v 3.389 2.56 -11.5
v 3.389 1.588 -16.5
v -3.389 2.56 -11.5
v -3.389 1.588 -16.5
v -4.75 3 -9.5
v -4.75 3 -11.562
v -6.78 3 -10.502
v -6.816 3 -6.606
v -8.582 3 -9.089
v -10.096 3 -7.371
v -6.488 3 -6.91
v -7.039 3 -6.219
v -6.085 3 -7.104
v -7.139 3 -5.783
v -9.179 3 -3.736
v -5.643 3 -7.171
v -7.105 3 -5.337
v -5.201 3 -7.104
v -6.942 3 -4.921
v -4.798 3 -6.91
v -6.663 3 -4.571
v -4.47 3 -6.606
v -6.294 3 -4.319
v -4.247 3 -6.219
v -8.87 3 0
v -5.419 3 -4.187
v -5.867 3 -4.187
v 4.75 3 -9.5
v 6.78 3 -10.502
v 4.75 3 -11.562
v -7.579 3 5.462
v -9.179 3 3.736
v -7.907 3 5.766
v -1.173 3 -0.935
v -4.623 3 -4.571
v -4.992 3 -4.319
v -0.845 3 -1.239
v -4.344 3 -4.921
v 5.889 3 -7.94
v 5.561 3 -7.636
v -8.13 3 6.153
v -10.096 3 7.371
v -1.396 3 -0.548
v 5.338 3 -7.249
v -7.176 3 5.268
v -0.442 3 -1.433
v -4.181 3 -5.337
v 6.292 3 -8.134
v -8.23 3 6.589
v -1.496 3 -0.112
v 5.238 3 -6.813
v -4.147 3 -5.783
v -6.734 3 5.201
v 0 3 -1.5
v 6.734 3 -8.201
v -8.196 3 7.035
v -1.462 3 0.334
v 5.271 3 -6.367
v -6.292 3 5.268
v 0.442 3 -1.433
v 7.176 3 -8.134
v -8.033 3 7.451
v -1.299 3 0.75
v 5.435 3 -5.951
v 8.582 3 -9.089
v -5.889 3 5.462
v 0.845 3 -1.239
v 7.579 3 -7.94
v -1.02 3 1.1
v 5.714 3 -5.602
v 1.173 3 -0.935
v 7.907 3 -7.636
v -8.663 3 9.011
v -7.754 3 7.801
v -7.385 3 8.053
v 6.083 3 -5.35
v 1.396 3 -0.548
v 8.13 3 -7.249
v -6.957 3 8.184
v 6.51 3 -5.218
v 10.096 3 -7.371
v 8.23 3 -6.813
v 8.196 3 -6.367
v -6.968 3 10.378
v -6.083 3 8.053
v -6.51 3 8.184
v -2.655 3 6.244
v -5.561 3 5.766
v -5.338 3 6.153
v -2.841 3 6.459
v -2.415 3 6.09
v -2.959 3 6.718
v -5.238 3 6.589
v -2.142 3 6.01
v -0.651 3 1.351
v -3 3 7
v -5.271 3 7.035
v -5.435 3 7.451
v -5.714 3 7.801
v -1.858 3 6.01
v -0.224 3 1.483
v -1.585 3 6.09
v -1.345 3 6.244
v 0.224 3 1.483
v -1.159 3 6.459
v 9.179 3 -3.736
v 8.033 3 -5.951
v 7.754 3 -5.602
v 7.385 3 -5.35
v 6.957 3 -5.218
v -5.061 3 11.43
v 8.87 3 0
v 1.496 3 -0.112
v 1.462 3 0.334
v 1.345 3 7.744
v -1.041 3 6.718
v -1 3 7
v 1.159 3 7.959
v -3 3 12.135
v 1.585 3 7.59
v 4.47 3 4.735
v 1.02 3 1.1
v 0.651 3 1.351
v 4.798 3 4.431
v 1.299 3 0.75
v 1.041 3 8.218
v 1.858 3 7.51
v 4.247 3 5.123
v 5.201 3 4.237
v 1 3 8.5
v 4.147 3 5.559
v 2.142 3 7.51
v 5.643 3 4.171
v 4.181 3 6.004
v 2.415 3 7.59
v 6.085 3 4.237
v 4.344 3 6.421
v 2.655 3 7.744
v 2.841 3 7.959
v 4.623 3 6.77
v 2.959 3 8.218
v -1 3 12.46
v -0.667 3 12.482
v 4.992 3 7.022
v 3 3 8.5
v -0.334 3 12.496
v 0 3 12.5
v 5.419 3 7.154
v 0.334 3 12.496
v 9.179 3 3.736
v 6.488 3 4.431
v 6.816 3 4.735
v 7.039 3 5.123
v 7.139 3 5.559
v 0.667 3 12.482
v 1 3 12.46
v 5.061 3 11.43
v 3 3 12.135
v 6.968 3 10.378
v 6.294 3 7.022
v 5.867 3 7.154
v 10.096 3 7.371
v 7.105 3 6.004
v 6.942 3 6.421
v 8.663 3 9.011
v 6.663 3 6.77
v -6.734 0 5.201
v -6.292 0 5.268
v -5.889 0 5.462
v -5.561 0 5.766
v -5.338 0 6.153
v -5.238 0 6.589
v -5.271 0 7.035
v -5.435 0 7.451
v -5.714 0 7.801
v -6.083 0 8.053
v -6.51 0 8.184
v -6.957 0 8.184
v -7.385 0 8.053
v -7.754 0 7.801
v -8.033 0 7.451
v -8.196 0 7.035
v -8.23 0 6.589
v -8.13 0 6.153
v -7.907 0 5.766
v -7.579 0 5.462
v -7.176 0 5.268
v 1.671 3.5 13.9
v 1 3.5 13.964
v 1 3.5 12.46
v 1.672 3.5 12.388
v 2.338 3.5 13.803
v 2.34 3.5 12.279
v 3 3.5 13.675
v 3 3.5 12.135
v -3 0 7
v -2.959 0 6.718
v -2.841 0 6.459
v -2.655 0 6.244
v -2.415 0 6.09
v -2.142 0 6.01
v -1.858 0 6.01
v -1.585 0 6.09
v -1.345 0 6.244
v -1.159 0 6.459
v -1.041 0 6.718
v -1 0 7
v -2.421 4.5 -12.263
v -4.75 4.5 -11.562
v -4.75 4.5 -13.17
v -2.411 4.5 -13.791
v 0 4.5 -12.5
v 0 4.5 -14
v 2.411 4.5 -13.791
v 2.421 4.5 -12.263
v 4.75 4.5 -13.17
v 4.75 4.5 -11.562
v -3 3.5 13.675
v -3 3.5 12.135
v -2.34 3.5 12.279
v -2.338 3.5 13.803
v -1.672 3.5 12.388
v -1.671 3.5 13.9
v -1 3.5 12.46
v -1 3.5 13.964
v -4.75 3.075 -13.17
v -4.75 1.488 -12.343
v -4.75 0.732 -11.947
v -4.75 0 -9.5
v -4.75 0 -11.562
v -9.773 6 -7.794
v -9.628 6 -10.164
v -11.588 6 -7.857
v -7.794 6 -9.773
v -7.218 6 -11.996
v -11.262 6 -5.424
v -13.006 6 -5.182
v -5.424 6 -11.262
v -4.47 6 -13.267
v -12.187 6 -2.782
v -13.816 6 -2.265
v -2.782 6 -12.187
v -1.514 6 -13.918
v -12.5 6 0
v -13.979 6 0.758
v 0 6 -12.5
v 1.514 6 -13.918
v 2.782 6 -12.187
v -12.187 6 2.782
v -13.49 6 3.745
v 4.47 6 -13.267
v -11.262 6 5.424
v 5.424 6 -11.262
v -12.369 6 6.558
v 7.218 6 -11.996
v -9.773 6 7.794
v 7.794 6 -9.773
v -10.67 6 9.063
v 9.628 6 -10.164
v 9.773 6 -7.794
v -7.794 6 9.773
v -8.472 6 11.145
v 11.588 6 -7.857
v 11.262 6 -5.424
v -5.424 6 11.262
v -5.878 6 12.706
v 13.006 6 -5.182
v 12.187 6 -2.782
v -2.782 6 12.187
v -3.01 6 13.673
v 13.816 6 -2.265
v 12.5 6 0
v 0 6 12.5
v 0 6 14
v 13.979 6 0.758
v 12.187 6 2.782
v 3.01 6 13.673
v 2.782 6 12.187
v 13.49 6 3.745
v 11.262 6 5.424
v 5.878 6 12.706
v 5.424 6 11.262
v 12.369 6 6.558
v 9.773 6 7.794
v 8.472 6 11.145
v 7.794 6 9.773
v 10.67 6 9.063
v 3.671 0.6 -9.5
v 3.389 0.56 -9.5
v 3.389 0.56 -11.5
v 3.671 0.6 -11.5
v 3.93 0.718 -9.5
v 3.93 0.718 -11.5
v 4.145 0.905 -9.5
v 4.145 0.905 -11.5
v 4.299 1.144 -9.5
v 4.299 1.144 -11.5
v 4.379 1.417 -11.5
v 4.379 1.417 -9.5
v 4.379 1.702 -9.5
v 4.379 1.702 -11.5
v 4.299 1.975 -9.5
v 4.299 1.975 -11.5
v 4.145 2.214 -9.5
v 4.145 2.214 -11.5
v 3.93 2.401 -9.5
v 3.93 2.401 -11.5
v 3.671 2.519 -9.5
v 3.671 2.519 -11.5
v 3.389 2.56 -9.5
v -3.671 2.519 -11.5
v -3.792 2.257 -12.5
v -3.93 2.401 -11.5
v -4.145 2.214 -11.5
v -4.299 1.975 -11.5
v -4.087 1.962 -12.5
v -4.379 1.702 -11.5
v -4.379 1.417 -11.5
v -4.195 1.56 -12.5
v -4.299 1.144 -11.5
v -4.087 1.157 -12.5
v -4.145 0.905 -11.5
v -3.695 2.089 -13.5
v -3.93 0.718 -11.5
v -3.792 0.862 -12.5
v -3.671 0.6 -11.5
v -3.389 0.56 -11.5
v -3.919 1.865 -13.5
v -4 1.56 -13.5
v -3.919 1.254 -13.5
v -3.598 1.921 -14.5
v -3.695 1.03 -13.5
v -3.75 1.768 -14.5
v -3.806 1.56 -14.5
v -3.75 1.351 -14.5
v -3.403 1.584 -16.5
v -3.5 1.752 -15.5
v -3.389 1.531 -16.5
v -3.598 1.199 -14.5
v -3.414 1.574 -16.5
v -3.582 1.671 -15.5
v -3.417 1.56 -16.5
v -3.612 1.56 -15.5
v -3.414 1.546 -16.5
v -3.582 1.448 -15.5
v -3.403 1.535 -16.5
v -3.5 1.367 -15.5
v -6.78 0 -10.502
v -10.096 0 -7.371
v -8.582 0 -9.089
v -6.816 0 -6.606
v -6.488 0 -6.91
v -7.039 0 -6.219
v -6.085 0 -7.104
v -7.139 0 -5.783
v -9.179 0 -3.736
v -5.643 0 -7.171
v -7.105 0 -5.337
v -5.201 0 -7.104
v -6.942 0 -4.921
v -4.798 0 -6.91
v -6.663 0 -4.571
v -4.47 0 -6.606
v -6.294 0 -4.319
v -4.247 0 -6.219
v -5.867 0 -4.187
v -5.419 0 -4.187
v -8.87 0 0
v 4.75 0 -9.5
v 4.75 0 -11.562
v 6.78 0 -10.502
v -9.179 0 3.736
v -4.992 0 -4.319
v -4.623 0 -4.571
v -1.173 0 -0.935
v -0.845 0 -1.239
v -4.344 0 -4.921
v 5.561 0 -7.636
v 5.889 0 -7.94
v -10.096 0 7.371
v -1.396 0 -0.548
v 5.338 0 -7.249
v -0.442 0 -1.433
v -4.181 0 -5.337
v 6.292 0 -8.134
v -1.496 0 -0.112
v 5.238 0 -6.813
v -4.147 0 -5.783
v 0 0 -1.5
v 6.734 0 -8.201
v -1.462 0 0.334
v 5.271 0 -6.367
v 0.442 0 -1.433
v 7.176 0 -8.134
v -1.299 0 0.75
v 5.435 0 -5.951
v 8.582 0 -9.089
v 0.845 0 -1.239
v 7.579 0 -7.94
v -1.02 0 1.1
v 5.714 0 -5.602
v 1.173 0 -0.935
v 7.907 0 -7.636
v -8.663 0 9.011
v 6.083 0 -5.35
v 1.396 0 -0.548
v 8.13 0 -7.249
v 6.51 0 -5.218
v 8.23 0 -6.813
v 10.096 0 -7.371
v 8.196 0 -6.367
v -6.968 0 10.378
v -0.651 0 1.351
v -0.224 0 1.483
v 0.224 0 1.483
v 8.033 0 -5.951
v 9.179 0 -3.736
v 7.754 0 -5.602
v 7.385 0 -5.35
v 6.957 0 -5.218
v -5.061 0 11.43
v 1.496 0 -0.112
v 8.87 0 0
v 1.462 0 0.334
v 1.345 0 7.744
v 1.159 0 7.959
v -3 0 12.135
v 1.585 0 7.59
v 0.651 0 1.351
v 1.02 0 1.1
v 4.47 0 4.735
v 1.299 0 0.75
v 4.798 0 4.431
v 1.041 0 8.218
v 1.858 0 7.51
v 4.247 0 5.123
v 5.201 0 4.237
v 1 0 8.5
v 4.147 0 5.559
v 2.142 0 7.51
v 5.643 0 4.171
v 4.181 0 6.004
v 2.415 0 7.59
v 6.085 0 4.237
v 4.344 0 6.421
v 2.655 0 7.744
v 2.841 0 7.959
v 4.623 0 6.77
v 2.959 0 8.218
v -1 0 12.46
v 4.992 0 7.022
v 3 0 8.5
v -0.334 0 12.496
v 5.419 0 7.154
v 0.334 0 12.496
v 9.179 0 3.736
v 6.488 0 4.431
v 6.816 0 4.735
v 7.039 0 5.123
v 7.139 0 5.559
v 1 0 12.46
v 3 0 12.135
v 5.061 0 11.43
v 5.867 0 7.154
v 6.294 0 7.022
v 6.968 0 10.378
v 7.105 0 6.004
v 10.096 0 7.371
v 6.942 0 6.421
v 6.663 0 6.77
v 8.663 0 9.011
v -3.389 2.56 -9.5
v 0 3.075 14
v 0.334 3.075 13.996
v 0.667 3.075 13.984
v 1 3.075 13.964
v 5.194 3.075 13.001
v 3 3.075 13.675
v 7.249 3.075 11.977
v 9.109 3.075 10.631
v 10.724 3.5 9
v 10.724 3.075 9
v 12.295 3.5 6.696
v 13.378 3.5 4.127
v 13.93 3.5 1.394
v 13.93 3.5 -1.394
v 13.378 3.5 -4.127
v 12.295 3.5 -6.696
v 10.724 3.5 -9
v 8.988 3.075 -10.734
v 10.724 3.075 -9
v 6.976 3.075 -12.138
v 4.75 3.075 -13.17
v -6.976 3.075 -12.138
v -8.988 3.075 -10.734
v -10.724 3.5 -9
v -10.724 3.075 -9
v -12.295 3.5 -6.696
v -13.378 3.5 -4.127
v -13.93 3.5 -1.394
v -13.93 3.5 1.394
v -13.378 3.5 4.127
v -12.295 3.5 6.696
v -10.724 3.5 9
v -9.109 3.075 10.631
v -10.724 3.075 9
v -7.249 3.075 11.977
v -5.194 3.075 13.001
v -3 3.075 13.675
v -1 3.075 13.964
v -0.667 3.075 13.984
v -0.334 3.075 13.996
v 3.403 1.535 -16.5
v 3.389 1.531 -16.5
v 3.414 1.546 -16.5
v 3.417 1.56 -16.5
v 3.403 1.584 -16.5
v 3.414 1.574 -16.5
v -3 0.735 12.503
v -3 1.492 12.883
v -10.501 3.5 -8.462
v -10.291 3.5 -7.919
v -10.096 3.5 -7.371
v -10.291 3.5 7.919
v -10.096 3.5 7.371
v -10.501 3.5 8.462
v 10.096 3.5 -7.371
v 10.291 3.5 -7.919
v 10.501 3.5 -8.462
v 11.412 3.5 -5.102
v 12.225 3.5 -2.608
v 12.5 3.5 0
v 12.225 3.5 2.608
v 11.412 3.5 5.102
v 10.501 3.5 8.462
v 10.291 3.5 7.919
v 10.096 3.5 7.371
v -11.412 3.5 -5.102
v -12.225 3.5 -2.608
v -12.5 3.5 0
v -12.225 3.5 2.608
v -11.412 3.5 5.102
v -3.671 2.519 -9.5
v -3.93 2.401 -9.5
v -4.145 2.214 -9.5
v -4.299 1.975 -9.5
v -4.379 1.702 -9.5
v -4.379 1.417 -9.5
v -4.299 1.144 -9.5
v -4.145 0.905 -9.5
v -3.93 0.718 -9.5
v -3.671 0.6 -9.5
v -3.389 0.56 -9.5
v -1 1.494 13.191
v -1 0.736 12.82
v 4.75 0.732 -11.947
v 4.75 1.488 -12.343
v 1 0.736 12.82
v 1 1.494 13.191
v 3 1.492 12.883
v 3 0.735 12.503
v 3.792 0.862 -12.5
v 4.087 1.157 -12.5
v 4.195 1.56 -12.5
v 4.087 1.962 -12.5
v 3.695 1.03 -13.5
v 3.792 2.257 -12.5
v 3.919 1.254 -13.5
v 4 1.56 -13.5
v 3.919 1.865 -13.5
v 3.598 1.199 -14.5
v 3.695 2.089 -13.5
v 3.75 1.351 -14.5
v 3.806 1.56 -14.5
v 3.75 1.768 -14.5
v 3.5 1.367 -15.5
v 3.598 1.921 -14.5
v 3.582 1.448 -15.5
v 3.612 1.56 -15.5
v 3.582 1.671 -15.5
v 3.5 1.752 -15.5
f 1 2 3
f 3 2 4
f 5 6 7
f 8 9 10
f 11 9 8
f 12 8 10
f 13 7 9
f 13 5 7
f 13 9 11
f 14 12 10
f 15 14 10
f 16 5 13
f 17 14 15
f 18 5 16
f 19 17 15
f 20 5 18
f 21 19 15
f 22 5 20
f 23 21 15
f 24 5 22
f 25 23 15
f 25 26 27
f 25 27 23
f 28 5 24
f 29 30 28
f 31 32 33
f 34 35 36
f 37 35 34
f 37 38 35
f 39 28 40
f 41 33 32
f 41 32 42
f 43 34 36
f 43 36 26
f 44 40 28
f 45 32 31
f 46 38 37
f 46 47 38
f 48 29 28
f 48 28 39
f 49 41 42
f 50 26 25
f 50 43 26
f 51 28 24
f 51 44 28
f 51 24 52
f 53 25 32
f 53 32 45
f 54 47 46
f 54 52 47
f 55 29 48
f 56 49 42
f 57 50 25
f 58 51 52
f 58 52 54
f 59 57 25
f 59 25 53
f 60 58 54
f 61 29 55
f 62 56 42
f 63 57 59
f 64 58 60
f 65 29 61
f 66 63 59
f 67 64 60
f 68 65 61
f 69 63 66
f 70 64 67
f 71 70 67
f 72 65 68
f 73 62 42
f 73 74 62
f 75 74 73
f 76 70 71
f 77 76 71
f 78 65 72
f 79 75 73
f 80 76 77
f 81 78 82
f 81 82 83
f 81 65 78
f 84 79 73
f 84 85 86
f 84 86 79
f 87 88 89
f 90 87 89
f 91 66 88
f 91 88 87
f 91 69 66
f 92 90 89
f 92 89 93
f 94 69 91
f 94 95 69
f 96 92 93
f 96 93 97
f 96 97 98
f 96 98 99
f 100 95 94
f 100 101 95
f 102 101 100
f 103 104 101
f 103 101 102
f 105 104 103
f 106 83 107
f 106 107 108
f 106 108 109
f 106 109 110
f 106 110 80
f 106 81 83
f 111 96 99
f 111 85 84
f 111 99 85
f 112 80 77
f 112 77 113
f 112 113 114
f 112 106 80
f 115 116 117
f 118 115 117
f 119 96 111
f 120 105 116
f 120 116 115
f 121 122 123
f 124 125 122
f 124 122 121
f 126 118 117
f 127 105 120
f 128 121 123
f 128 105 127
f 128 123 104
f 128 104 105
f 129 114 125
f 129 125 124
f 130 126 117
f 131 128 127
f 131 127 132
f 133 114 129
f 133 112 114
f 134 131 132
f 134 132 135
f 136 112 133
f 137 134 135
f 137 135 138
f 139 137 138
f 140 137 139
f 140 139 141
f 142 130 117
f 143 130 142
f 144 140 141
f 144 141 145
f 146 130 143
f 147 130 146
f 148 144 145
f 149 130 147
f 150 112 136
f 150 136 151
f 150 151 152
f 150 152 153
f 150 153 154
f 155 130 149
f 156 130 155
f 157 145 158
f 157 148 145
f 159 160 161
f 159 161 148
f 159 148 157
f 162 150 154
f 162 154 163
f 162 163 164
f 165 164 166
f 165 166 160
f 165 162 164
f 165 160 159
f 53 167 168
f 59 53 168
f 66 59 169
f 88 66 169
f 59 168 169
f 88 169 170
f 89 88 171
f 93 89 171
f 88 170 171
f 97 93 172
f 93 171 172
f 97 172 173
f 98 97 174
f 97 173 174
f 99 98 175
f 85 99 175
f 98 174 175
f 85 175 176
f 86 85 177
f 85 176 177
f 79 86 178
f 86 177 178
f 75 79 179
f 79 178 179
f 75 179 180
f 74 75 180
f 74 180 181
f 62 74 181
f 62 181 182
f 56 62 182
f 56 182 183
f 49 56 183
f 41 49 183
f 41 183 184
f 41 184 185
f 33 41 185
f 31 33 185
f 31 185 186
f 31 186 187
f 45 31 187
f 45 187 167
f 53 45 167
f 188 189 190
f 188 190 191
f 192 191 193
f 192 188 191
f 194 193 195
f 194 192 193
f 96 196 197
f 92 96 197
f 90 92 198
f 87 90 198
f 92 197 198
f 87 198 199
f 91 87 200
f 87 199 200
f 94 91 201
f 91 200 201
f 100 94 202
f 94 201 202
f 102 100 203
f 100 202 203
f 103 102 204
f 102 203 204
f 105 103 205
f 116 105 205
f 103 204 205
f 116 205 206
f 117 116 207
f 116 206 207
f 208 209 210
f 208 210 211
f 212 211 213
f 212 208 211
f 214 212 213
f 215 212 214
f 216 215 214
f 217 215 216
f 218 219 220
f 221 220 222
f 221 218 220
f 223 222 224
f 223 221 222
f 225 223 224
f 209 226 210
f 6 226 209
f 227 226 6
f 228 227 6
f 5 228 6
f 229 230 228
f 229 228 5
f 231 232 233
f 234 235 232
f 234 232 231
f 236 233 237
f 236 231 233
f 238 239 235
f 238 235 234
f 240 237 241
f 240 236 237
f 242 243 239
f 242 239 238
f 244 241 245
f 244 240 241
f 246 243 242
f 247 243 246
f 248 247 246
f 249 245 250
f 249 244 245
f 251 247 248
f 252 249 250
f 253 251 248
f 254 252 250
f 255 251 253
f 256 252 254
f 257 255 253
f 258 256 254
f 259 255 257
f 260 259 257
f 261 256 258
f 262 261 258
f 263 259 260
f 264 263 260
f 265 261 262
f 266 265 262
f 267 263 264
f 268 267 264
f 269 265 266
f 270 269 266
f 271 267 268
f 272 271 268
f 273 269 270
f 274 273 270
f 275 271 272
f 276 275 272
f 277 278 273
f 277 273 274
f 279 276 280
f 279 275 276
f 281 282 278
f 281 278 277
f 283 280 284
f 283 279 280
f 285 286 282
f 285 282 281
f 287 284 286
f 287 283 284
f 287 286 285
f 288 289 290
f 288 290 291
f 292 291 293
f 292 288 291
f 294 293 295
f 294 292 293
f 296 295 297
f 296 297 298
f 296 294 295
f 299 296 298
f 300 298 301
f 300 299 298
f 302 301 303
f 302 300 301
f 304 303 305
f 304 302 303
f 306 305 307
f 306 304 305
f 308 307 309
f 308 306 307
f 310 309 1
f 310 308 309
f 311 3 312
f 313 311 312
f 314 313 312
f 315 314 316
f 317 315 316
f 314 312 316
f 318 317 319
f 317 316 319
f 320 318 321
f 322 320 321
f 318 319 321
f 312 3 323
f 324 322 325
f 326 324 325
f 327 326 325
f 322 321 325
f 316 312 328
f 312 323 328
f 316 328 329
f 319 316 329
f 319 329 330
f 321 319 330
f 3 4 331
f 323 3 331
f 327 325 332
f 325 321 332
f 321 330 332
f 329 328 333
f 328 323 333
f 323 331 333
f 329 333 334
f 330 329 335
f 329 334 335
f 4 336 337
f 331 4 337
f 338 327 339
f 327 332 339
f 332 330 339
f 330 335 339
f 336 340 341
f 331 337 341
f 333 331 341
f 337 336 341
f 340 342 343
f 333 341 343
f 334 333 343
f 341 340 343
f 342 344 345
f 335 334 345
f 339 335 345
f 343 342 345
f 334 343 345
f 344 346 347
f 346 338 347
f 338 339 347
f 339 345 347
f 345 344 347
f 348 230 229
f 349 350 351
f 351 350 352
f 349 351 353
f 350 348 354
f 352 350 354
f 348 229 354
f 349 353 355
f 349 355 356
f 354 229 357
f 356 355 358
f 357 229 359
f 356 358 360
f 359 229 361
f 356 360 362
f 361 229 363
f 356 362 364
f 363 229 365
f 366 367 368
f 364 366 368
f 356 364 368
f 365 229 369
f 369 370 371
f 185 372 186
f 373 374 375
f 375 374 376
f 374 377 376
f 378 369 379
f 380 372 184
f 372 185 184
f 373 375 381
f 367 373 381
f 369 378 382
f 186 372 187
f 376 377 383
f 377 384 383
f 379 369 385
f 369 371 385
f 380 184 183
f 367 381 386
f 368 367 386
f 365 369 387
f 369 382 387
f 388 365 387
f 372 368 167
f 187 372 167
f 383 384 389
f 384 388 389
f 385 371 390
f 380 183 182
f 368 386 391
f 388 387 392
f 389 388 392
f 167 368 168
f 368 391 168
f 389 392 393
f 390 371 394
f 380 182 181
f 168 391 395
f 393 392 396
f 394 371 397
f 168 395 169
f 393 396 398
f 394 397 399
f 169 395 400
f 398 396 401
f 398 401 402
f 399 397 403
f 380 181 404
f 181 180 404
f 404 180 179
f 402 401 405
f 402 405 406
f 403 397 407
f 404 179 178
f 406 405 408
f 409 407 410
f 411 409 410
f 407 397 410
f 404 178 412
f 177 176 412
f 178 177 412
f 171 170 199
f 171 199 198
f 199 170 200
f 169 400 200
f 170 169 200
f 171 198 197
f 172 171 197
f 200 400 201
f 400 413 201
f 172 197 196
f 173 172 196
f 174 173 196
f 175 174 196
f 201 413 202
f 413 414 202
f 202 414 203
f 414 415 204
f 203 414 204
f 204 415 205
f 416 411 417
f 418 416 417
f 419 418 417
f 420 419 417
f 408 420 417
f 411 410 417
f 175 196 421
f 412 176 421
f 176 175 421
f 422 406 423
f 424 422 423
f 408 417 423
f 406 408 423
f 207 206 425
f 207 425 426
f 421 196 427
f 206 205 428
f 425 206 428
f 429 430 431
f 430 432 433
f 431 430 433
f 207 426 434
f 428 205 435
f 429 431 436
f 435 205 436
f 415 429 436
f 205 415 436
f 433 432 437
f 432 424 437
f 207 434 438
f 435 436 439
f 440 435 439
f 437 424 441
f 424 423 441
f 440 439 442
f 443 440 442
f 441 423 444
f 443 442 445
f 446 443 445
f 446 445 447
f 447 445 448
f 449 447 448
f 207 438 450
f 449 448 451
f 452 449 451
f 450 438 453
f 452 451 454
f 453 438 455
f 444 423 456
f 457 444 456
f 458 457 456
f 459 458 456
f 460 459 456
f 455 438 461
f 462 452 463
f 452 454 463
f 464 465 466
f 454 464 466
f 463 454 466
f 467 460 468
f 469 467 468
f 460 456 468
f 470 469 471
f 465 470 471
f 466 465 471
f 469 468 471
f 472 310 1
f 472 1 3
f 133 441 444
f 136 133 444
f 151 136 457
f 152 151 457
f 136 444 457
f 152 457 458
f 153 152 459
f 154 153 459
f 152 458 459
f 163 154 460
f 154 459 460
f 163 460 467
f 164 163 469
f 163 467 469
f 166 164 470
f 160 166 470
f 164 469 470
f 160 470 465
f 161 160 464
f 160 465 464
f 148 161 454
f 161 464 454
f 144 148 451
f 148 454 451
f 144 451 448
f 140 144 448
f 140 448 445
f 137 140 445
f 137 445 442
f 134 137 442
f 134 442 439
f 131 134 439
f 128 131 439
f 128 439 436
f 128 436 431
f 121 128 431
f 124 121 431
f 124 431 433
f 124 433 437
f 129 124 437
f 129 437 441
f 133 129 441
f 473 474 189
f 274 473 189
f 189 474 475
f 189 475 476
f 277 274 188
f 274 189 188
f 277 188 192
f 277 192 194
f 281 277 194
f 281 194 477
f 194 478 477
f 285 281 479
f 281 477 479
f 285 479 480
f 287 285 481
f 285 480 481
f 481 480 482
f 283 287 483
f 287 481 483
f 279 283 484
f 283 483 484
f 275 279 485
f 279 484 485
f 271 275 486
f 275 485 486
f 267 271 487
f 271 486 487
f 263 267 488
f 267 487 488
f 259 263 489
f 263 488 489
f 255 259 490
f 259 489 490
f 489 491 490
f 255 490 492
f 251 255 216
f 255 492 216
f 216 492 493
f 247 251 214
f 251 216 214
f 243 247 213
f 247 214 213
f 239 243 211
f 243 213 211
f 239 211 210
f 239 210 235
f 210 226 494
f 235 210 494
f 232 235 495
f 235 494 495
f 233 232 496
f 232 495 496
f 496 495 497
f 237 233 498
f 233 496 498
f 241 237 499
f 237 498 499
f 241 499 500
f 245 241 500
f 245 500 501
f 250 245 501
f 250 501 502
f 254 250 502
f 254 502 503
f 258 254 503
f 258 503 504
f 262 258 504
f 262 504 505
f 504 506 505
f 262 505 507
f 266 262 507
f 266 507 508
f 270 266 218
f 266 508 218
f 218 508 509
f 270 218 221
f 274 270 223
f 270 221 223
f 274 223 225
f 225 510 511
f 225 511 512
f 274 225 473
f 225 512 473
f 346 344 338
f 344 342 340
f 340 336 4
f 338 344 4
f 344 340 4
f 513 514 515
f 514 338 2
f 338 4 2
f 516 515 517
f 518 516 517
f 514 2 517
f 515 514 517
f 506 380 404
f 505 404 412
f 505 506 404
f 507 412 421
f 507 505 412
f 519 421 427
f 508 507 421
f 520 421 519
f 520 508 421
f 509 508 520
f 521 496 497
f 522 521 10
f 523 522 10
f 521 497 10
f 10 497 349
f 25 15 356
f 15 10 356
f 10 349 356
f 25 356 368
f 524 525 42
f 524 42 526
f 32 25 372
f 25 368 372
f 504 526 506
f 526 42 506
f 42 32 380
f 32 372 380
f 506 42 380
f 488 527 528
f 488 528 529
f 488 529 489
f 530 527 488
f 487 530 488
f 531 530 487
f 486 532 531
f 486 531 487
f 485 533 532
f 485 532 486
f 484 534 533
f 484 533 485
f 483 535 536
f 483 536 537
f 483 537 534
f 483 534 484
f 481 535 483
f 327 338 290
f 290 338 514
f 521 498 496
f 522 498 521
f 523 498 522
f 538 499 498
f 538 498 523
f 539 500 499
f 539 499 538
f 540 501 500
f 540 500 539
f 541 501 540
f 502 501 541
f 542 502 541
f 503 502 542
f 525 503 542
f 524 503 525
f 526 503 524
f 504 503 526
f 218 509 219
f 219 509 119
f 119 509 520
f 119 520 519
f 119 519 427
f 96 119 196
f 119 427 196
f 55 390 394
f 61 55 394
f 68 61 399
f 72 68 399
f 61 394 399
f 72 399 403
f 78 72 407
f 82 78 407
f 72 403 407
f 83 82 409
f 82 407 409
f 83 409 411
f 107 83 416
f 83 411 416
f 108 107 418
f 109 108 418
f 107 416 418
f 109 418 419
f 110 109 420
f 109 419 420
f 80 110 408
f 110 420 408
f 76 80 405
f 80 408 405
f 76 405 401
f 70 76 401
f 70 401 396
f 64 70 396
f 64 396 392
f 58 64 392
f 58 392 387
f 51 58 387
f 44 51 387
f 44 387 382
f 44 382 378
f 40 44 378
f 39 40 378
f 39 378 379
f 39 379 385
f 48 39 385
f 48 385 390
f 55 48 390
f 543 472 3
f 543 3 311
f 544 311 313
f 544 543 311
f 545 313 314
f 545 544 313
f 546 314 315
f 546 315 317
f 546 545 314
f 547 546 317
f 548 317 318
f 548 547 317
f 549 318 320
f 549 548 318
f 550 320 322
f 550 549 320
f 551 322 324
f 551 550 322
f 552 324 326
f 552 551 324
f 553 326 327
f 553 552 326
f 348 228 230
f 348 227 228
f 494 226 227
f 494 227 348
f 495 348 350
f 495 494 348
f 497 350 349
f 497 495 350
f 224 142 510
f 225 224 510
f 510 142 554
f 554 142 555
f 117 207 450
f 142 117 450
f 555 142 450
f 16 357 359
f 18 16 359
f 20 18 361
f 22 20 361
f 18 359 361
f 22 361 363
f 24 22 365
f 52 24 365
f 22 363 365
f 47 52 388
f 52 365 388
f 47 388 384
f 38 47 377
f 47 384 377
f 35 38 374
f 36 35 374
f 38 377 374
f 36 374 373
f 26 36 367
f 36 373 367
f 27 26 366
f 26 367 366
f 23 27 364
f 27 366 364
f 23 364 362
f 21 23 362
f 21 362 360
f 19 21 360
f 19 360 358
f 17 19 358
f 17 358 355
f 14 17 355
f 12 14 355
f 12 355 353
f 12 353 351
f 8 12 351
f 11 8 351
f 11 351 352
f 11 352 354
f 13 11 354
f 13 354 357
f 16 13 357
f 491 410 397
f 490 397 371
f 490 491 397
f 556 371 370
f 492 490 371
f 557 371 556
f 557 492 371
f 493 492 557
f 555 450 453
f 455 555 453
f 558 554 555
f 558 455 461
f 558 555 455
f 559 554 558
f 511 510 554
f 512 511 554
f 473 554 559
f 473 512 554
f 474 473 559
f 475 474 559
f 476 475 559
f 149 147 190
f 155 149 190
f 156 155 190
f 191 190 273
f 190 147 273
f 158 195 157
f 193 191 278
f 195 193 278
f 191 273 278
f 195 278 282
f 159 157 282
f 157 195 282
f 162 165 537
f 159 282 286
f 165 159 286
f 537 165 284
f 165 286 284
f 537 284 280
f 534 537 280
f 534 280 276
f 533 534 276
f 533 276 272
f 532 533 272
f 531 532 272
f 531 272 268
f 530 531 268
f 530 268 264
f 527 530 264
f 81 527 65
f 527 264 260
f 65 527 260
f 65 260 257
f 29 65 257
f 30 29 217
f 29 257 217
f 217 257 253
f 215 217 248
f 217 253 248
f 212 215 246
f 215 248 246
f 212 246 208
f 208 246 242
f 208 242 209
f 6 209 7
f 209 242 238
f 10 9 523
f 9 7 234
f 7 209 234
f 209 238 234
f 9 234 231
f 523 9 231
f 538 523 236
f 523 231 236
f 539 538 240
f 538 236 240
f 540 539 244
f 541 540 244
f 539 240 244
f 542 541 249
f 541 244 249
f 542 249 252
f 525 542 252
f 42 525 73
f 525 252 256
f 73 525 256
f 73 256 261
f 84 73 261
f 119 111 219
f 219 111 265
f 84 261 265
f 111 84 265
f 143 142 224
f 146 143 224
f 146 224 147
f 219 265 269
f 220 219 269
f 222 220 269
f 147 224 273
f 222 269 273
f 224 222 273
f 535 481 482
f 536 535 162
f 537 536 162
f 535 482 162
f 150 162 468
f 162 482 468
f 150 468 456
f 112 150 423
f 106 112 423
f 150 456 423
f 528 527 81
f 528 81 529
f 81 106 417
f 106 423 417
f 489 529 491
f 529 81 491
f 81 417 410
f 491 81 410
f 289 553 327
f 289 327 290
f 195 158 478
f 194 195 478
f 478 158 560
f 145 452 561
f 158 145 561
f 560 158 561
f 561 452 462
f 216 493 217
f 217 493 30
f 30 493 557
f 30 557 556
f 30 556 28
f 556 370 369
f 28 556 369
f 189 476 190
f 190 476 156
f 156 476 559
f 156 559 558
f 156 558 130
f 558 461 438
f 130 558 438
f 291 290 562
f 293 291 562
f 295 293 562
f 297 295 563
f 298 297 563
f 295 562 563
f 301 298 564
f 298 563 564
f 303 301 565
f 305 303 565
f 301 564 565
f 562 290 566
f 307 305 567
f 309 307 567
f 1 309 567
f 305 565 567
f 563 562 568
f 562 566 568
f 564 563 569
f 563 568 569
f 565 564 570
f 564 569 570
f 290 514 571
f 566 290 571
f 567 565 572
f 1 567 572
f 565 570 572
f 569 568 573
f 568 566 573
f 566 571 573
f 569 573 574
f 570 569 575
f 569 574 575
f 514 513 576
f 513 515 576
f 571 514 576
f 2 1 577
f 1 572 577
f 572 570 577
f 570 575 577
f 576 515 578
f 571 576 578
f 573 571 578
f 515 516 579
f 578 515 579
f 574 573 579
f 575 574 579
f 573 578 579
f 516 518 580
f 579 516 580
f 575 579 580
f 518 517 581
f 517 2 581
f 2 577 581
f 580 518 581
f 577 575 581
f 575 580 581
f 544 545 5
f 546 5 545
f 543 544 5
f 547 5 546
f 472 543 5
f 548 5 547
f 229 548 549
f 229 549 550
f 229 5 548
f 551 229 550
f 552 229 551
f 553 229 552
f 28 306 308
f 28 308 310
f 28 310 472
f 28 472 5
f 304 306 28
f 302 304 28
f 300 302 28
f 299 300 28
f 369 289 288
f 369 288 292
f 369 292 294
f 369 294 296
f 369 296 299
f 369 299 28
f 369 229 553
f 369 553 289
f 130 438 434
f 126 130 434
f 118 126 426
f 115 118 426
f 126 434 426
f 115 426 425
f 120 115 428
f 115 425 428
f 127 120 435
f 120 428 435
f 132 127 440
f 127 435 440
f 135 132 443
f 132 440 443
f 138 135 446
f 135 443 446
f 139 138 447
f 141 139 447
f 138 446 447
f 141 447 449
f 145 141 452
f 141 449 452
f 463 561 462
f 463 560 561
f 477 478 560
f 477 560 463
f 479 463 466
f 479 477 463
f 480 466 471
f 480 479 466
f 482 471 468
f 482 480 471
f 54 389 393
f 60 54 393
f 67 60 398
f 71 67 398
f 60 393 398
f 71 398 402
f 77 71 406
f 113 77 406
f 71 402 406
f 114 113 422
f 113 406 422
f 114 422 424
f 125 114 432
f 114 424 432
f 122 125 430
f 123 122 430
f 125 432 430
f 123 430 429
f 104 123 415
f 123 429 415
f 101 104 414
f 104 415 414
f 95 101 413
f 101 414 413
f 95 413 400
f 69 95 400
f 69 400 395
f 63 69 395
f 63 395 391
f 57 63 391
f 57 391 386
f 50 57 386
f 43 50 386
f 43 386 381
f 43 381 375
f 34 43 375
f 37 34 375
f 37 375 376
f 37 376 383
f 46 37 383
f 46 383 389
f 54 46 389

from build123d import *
from OCP.BRepFilletAPI import BRepFilletAPI_MakeChamfer

# Parameters (mm, degrees)
SCHIZZO1_R                   = 14
ESTRUSIONE_ESTRUSIONE1_DEPTH = 6
SCHIZZO2_W                   = 9.5
SCHIZZO2_H                   = 5
TAGLIO_ESTRUSIONE1_DEPTH     = 4.5
SCHIZZO3_R                   = 12.5
TAGLIO_ESTRUSIONE2_DEPTH     = 3
TAGLIO_ESTRUSIONE4_DEPTH     = 3.5
SMUSSO1_SIZE                 = 1.5
SMUSSO1_SIZE2                = 3.075455762
SCHIZZO8_R                   = 22.778601144
TAGLIO_ESTRUSIONE6_DEPTH     = 3.5
ESTRUSIONE_ESTRUSIONE2_DEPTH = 7
SMUSSO2_SIZE                 = 5
SMUSSO2_SIZE2                = 0.971901546
SCHIZZO14_R                  = 1.5
TAGLIO_ESTRUSIONE10_DEPTH    = 23.455511573
SCHIZZO17_R                  = 1.5
TAGLIO_ESTRUSIONE12_DEPTH    = 32


with BuildPart() as part:
    # Schizzo1 → Estrusione-Estrusione1 (new body)
    with BuildSketch(Plane(origin=(0, 0, 0), x_dir=(1, 0, 0), z_dir=(0, 1, 0))):
        with Locations(Location((0, 0, 0), (0, 0, 270))):
            Circle(SCHIZZO1_R)
    extrude(amount=ESTRUSIONE_ESTRUSIONE1_DEPTH)

    # Schizzo2 → Taglio-Estrusione1 (cut)
    with BuildSketch(Plane.XZ):
        with Locations((0, -12)):
            Rectangle(SCHIZZO2_W, SCHIZZO2_H)
    extrude(amount=-TAGLIO_ESTRUSIONE1_DEPTH, mode=Mode.SUBTRACT)

    # Schizzo3 → Taglio-Estrusione2 (cut)
    with BuildSketch(Plane(origin=(0, 6, 0), x_dir=(1, 0, 0), z_dir=(0, 1, 0))):
        with Locations(Location((0, 0, 0), (0, 0, 270))):
            Circle(SCHIZZO3_R)
    extrude(amount=-TAGLIO_ESTRUSIONE2_DEPTH, mode=Mode.SUBTRACT)

    # Schizzo4 → Taglio-Estrusione4 (cut)
    with BuildSketch(Plane.XZ):
        with BuildLine():
            Line((-1, 7), (-1, 13.964240044))
            ThreePointArc((-1, 13.964240044), (-2.00522934, 13.855650663), (-3, 13.674794331))
            Line((-3, 13.674794331), (-3, 7))
            ThreePointArc((-3, 7), (-2, 6), (-1, 7))
        make_face()
        with BuildLine():
            ThreePointArc((3, 13.674794331), (2.00522934, 13.855650663), (1, 13.964240044))
            Line((1, 13.964240044), (1, 8.5))
            ThreePointArc((1, 8.5), (2, 7.5), (3, 8.5))
            Line((3, 8.5), (3, 13.674794331))
        make_face()
    extrude(amount=-TAGLIO_ESTRUSIONE4_DEPTH, mode=Mode.SUBTRACT)

    # Smusso1
    smusso1_edges = [part.edges().sort_by_distance(p)[0] for p in [
        (0.500319591, 0, 13.991057155),
        (-13.970345786, 0, 0.910735206),
        (13.970345786, 0, 0.910735206),
    ]]
    smusso1_side = [part.faces().sort_by_distance(p)[0] for p in [
        (0.010947271, 0, 0.331138895),
    ]]
    chamfer(smusso1_edges, length=SMUSSO1_SIZE, length2=SMUSSO1_SIZE2, reference=smusso1_side[0])

    # Schizzo8 → Taglio-Estrusione6 (cut)
    with BuildSketch(Plane.XZ):
        with Locations((-31.649021425, 0)):
            Circle(SCHIZZO8_R)
        with Locations((31.649021425, 0)):
            Circle(SCHIZZO8_R)
    extrude(amount=-TAGLIO_ESTRUSIONE6_DEPTH, mode=Mode.SUBTRACT)

    # Schizzo10 → Estrusione-Estrusione2 (add)
    with BuildSketch(Plane(origin=(0, 0, -9.5), x_dir=(-1, 0, 0), z_dir=(0, 0, -1))):
        with BuildLine():
            Line((-3.389234254, 2.559575442), (3.389234254, 2.559575442))
            ThreePointArc((3.389234254, 2.559575442), (4.389234254, 1.559575442), (3.389234254, 0.559575442))
            Line((3.389234254, 0.559575442), (-3.389234254, 0.559575442))
            ThreePointArc((-3.389234254, 0.559575442), (-4.389234254, 1.559575442), (-3.389234254, 2.559575442))
        make_face()
    extrude(amount=ESTRUSIONE_ESTRUSIONE2_DEPTH)

    # Smusso2: one chamfer whose edges measure the first distance from different faces: ONE call of the kernel's chamfer builder (chamfer() names one face for all edges)
    smusso2_edges_1 = [part.edges().sort_by_distance(p)[0] for p in [
        (4.389234254, 1.559575442, -16.5),
    ]]
    smusso2_side_1 = [part.faces().sort_by_distance(p)[0] for p in [
        (4.389234254, 1.559575442, -13),
    ]]
    smusso2_edges_2 = [part.edges().sort_by_distance(p)[0] for p in [
        (0, 0.559575442, -16.5),
    ]]
    smusso2_side_2 = [part.faces().sort_by_distance(p)[0] for p in [
        (0, 0.559575442, -13),
    ]]
    smusso2_edges_3 = [part.edges().sort_by_distance(p)[0] for p in [
        (-4.389234254, 1.559575442, -16.5),
    ]]
    smusso2_side_3 = [part.faces().sort_by_distance(p)[0] for p in [
        (-4.389234254, 1.559575442, -13),
    ]]
    smusso2_edges_4 = [part.edges().sort_by_distance(p)[0] for p in [
        (0, 2.559575442, -16.5),
    ]]
    smusso2_side_4 = [part.faces().sort_by_distance(p)[0] for p in [
        (0, 2.559575442, -13),
    ]]
    smusso2 = BRepFilletAPI_MakeChamfer(part.part.solid().wrapped)
    for e in smusso2_edges_1:
        smusso2.Add(SMUSSO2_SIZE, SMUSSO2_SIZE2, e.wrapped, smusso2_side_1[0].wrapped)  # the first distance lies on this face
    for e in smusso2_edges_2:
        smusso2.Add(SMUSSO2_SIZE, SMUSSO2_SIZE2, e.wrapped, smusso2_side_2[0].wrapped)  # the first distance lies on this face
    for e in smusso2_edges_3:
        smusso2.Add(SMUSSO2_SIZE, SMUSSO2_SIZE2, e.wrapped, smusso2_side_3[0].wrapped)  # the first distance lies on this face
    for e in smusso2_edges_4:
        smusso2.Add(SMUSSO2_SIZE, SMUSSO2_SIZE2, e.wrapped, smusso2_side_4[0].wrapped)  # the first distance lies on this face
    add(Compound.cast(smusso2.Shape()), mode=Mode.REPLACE)

    # Schizzo14 → Taglio-Estrusione10 (cut, through all)
    with BuildSketch(Plane.XZ):
        with Locations(Location((6.733876165, -6.701112728, 0), (0, 0, 270))):
            Circle(SCHIZZO14_R)
        with Locations(Location((-6.733876165, 6.701112728, 0), (0, 0, 270))):
            Circle(SCHIZZO14_R)
        with Locations(Location((5.643042298, 5.67063256, 0), (0, 0, 270))):
            Circle(SCHIZZO14_R)
        with Locations(Location((-5.643042298, -5.67063256, 0), (0, 0, 270))):
            Circle(SCHIZZO14_R)
    extrude(amount=-TAGLIO_ESTRUSIONE10_DEPTH, mode=Mode.SUBTRACT)

    # Schizzo17 → Taglio-Estrusione12 (cut)
    with BuildSketch(Plane.XZ):
        with Locations(Location((0, 0, 0), (0, 0, 270))):
            Circle(SCHIZZO17_R)
    extrude(amount=-TAGLIO_ESTRUSIONE12_DEPTH, mode=Mode.SUBTRACT)


solid = part.part
